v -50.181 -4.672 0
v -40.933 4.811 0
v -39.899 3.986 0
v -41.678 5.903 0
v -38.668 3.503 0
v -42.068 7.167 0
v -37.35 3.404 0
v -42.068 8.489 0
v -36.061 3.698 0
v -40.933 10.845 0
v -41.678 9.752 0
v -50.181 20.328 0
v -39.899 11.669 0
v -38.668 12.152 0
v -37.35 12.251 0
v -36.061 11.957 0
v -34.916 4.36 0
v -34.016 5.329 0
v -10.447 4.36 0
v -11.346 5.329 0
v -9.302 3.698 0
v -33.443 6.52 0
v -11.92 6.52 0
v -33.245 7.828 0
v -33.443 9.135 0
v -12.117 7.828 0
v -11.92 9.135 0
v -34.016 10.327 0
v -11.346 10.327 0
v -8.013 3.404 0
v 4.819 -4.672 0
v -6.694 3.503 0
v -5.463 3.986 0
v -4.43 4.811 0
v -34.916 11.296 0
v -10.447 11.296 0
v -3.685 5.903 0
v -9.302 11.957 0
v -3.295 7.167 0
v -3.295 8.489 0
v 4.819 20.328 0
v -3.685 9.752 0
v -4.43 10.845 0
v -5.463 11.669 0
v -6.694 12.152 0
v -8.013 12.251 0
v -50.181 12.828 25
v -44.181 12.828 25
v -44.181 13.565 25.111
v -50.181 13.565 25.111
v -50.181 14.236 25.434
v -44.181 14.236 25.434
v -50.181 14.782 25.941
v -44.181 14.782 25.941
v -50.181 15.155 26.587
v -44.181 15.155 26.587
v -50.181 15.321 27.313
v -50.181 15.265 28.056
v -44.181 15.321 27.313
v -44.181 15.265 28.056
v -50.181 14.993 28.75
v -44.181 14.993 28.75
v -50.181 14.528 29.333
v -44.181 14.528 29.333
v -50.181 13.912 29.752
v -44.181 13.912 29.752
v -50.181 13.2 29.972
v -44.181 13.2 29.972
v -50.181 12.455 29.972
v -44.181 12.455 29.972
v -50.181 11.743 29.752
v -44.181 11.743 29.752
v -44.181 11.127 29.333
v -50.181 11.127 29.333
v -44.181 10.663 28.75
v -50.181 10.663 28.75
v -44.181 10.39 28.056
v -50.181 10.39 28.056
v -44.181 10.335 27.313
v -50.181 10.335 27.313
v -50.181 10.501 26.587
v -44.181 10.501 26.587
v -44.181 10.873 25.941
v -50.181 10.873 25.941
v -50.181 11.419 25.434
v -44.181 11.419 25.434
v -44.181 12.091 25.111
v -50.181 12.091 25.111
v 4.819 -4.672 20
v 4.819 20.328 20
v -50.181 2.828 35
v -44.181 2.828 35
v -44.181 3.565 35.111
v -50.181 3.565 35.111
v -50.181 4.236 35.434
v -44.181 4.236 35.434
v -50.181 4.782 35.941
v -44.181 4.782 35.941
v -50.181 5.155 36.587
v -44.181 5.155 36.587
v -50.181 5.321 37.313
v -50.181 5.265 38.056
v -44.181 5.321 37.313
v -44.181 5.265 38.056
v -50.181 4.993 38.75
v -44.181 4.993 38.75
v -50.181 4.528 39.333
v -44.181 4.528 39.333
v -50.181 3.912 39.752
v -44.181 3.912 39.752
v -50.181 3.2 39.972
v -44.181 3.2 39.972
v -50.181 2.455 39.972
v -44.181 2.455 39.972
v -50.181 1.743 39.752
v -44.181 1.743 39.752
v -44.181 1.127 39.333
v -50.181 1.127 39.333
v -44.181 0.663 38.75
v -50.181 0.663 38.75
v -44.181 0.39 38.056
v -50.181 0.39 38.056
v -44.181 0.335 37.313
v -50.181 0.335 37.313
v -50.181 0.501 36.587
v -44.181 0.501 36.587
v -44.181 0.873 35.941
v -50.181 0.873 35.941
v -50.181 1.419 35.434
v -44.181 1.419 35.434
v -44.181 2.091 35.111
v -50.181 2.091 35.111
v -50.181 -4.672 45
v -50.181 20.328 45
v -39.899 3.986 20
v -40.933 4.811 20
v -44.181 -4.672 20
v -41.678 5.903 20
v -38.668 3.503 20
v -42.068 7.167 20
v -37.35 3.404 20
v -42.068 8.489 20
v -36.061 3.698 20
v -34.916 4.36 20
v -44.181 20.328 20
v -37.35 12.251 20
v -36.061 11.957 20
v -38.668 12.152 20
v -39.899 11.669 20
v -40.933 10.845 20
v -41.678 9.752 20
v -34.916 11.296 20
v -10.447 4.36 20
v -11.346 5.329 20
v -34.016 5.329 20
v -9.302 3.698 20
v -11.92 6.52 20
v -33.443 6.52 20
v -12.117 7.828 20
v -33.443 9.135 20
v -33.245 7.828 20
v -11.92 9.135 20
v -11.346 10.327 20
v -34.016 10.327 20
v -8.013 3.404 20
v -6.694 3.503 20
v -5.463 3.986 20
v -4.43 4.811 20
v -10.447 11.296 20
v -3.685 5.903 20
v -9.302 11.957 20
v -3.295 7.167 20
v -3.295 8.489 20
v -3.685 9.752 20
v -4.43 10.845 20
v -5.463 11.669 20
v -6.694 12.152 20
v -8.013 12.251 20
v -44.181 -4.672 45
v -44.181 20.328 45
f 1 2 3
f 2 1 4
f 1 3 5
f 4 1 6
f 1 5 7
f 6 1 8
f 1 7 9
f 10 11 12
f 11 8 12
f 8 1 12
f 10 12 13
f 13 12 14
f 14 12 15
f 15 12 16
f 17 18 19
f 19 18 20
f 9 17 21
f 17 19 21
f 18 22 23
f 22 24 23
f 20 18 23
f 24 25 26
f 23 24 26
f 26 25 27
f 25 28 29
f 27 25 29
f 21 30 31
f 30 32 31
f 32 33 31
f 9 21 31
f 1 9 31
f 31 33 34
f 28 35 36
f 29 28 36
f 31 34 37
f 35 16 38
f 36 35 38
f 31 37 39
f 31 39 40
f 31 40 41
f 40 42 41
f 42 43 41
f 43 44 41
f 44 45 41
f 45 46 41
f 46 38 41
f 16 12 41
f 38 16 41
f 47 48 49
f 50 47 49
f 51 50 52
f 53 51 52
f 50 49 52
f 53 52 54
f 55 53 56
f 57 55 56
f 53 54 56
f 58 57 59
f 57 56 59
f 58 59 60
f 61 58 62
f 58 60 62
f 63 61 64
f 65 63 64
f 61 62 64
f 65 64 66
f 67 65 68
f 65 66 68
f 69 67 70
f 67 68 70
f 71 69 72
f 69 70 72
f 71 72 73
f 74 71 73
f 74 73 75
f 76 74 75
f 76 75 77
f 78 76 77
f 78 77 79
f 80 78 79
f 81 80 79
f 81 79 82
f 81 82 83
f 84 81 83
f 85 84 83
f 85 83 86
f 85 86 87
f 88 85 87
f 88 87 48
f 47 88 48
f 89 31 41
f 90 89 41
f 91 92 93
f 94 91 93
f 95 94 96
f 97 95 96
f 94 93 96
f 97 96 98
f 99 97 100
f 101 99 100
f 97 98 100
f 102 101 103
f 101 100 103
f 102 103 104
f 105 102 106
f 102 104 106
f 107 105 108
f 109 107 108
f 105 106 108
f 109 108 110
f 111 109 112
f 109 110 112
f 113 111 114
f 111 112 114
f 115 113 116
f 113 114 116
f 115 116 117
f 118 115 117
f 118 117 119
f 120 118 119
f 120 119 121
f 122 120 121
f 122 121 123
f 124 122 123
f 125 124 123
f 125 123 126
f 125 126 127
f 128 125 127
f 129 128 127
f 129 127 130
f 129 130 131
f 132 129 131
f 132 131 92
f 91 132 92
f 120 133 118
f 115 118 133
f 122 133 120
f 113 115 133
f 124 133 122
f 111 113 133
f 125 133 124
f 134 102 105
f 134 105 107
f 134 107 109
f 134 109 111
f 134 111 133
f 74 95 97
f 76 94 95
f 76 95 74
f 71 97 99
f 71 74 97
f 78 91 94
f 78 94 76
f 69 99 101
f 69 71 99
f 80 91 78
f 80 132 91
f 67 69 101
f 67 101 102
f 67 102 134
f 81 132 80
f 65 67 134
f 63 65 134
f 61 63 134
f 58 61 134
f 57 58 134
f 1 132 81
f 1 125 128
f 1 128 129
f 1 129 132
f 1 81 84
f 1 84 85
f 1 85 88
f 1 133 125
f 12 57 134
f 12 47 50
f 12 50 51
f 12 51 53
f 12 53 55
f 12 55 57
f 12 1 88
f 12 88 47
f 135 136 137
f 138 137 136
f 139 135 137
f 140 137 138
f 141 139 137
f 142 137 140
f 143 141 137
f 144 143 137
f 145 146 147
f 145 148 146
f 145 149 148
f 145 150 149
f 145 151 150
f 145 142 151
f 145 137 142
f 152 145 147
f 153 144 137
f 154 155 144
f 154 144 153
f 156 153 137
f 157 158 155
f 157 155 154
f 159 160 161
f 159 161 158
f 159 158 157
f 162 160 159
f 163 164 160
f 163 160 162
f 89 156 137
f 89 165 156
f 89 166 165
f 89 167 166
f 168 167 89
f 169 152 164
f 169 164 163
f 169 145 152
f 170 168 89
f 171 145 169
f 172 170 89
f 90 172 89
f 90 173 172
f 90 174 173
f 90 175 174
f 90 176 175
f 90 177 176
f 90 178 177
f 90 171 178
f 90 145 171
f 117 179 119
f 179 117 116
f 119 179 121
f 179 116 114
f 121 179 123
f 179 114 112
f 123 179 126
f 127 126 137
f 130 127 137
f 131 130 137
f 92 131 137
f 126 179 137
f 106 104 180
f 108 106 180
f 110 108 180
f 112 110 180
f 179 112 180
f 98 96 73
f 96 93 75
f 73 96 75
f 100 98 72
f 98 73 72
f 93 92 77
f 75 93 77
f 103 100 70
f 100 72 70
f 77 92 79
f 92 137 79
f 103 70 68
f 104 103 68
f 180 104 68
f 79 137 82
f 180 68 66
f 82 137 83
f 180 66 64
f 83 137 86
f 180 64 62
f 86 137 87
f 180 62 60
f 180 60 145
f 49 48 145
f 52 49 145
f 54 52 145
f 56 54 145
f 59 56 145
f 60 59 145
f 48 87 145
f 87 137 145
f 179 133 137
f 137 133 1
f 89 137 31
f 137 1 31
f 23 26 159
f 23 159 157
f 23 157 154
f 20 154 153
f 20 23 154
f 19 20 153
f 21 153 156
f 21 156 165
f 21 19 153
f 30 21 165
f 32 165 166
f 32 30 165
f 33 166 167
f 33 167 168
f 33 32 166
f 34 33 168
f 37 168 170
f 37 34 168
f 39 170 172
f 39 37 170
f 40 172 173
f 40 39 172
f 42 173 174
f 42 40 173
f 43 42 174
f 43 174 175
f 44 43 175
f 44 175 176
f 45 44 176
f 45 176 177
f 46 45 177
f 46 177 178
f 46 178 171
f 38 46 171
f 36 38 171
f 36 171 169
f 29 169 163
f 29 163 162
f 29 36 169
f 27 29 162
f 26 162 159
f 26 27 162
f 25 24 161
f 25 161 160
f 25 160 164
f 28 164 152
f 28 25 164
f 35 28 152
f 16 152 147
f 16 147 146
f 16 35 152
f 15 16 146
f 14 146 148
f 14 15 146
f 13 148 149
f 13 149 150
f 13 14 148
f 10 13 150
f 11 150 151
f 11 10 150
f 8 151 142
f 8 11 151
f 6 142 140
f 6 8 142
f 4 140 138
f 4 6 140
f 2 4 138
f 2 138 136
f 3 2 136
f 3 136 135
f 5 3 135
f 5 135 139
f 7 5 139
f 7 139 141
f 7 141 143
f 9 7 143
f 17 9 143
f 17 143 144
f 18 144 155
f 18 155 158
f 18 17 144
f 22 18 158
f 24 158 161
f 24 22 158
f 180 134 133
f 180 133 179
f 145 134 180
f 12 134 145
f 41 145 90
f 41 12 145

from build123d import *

# Parameters (mm, degrees)
SKETCH_1_W          = 55
SKETCH_1_H          = 25
SKETCH_1_R          = 4.435900657
EXTRUDE_1_DEPTH     = 20
SKETCH_2_W          = 6
SKETCH_2_H          = 25
EXTRUDE_2_DEPTH     = 25
SKETCH_3_R          = 2.5
CUT_EXTRUDE_1_DEPTH = 70.564485554


with BuildPart() as part:
    # 草图1 → 凸台-拉伸1 (new body)
    with BuildSketch(Plane.XY):
        with Locations((-22.681333333, 7.827755665)):
            Rectangle(SKETCH_1_W, SKETCH_1_H)
        with Locations((-37.681333333, 7.827755665)):
            Circle(SKETCH_1_R, mode=Mode.SUBTRACT)
        with Locations(Location((-7.681333333, 7.827755665, 0), (0, 0, 180))):
            Circle(SKETCH_1_R, mode=Mode.SUBTRACT)
    extrude(amount=EXTRUDE_1_DEPTH)

    # 草图2 → 凸台-拉伸2 (add)
    with BuildSketch(Plane.XY.offset(20)):
        with Locations((-47.181333333, 7.827755665)):
            Rectangle(SKETCH_2_W, SKETCH_2_H)
    extrude(amount=EXTRUDE_2_DEPTH)

    # 草图3 → 切除-拉伸1 (cut, through all)
    with BuildSketch(Plane(origin=(-44.181333333, 0, 0), x_dir=(0, 0, -1), z_dir=(1, 0, 0))):
        with Locations((-37.5, 2.827755665)):
            Circle(SKETCH_3_R)
        with Locations((-27.5, 12.827755665)):
            Circle(SKETCH_3_R)
    extrude(amount=-CUT_EXTRUDE_1_DEPTH, mode=Mode.SUBTRACT)


solid = part.part
